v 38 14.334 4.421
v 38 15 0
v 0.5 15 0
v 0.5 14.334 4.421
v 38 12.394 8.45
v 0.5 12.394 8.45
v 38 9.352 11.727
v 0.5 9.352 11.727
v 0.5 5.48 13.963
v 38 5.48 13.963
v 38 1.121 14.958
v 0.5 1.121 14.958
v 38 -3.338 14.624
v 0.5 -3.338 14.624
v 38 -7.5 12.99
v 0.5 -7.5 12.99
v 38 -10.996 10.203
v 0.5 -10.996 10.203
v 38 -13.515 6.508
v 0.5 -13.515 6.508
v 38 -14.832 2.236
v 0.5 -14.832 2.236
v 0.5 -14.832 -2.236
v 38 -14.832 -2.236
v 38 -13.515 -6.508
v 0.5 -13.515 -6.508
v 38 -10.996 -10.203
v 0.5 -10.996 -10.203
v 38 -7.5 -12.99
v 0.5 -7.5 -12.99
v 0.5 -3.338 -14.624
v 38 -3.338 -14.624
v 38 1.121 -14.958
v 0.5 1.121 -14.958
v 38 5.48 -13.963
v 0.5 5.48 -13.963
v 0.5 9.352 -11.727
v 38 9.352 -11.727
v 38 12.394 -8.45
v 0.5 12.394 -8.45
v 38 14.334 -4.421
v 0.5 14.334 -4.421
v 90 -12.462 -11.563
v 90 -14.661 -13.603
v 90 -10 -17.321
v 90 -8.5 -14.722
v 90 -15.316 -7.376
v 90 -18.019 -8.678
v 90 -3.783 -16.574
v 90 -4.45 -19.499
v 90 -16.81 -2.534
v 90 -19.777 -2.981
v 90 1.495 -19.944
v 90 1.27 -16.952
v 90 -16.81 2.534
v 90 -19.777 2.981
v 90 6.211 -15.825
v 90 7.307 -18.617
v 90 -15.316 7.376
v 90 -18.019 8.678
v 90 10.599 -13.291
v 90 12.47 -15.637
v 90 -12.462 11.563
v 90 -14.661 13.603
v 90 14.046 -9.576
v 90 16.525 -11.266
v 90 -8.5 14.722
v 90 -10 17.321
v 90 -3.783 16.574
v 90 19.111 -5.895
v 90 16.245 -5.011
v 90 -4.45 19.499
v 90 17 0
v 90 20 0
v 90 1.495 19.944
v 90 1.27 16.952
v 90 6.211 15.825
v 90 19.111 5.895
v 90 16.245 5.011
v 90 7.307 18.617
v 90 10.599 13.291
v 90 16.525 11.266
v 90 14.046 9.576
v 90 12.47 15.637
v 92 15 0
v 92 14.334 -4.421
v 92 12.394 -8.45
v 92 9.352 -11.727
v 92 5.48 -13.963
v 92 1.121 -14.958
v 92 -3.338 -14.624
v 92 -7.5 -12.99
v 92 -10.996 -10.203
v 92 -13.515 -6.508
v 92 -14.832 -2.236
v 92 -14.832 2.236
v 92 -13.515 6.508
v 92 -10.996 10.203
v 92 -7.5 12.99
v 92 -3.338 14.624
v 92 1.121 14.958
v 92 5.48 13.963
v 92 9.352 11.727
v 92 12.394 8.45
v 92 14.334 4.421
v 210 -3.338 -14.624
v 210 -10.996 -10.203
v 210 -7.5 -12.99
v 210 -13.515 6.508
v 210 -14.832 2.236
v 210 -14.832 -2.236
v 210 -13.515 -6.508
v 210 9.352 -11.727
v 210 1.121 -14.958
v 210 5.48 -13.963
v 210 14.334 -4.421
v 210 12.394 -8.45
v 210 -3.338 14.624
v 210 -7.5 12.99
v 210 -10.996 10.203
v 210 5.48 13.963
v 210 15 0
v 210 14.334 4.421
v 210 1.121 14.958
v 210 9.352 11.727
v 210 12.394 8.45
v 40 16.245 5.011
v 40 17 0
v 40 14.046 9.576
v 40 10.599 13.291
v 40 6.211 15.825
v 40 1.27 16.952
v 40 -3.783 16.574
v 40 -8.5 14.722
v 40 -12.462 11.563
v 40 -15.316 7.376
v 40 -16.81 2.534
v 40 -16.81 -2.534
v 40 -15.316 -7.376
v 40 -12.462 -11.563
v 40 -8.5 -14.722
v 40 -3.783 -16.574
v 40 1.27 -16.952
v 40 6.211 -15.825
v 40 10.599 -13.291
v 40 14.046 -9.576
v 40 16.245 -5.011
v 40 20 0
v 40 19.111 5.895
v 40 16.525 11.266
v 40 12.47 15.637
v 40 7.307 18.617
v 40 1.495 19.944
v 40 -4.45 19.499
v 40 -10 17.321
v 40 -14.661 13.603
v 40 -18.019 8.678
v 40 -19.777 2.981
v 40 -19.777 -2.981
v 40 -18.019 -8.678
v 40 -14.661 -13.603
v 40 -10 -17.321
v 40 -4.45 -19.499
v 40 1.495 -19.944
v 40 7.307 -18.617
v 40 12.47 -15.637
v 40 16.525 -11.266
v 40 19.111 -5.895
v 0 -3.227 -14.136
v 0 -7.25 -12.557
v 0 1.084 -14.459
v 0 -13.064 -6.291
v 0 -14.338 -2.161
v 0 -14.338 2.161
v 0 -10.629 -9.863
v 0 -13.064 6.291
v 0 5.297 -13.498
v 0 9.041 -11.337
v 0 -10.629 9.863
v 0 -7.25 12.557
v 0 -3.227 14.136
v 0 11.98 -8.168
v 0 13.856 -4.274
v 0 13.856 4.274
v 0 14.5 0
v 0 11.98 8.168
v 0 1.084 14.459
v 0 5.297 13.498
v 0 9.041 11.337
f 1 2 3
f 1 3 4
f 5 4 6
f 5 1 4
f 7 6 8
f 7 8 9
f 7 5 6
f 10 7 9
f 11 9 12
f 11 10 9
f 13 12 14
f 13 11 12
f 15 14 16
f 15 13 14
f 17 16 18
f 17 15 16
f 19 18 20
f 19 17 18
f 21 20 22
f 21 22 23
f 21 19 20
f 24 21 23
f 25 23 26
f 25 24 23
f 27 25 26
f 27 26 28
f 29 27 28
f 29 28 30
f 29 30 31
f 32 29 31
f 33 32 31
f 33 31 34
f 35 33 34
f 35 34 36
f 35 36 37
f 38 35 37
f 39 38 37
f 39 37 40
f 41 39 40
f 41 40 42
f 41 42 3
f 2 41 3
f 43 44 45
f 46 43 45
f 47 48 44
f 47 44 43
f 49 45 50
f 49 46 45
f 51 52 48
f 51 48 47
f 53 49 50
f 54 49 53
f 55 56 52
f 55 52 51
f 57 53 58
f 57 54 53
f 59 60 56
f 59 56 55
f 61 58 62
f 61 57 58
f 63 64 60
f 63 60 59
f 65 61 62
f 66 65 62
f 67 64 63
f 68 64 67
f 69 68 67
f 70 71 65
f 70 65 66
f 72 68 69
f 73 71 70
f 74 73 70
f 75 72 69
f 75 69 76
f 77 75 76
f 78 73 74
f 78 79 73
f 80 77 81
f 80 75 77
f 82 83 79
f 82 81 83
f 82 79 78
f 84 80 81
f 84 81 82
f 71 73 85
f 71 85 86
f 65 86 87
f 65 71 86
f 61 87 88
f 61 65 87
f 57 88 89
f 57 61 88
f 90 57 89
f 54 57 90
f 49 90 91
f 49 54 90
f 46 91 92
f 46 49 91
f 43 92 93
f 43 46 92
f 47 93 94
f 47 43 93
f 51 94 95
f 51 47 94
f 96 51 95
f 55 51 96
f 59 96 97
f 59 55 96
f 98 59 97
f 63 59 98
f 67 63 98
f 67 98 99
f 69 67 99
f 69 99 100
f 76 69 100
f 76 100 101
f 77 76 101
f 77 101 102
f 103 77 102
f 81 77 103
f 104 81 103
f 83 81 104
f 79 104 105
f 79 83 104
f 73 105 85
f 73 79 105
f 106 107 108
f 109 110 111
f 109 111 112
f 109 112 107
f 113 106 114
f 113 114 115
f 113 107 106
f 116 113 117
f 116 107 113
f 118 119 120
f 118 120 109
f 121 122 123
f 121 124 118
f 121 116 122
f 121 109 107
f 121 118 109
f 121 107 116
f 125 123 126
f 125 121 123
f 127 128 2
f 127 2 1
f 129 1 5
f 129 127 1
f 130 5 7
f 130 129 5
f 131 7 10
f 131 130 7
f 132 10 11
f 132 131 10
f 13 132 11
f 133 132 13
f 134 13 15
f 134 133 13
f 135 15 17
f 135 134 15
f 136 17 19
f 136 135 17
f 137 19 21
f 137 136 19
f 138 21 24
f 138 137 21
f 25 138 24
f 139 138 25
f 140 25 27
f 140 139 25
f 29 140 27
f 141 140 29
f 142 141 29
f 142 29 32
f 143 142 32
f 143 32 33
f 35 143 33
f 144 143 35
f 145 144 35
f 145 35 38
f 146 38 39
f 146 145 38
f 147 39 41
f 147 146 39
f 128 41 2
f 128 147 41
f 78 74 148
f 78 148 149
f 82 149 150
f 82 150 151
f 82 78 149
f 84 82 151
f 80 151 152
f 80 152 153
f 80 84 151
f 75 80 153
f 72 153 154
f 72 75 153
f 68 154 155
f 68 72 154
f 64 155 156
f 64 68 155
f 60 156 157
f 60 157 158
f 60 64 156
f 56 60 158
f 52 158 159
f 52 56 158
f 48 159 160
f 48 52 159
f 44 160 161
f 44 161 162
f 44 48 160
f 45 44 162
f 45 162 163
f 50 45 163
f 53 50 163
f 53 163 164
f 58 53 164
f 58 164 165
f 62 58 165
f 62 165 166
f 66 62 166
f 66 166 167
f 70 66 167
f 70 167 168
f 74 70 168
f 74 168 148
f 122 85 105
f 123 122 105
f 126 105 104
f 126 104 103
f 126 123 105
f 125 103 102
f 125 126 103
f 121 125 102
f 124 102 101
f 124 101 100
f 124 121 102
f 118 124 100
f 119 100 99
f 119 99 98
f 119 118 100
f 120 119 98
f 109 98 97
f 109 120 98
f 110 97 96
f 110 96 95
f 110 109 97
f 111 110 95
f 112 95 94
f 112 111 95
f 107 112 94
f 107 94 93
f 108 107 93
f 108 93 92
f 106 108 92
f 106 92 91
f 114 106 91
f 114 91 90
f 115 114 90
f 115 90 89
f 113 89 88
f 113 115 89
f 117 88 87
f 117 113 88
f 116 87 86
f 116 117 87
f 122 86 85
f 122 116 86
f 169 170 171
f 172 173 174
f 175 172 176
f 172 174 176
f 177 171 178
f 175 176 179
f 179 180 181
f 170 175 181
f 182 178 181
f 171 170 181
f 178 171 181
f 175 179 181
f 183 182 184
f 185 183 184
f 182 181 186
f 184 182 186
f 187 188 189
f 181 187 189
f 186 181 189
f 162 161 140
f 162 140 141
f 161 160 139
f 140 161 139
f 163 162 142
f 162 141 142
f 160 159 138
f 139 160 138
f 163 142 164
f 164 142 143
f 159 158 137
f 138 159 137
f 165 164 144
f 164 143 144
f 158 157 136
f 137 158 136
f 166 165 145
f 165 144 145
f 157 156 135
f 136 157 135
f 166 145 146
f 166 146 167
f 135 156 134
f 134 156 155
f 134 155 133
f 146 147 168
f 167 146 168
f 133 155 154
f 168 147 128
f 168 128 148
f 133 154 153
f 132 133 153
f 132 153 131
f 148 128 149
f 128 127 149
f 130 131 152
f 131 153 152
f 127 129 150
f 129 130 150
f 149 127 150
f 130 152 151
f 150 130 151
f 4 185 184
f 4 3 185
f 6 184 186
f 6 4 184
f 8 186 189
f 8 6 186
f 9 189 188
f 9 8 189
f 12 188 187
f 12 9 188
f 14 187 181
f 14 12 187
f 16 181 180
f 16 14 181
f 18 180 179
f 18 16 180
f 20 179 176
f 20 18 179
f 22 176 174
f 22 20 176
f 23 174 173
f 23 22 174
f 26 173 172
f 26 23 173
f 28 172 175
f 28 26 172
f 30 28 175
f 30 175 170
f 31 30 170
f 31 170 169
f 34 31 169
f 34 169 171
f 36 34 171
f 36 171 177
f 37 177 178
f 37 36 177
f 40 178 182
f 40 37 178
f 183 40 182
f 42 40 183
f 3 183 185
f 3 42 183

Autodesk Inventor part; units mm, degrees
ref_plane "Start Plane" through (0, 0, 0) normal (1, 0, 0) x (0, 1, 0)
ref_plane "XZ Plane" through (0, 0, 0) normal (0, 1, 0) x (-1, 0, 0)
ref_plane "XY Plane" through (0, 0, 0) normal (0, 0, 1) x (1, 0, 0)
sketch "Main Sketch" plane through (0, 0, 0) normal (0, 0, 1) x (1, 0, 0)
  line L0 (0, 0) -> (210, 0)
  line L1 (0, 0) -> (0, 15)
  line L2 (0, 15) -> (40, 15)
  line L3 (40, 15) -> (40, 20)
  line L4 (90, 20) -> (90, 15)
  line L5 (40, 20) -> (90, 20)
  line L6 (210, 15) -> (210, 0)
  line L7 (90, 15) -> (210, 15)
  dimension "d3" = 30
  dimension "d4" = 40
  dimension "d5" = 30
revolve "Revolution1" add sketch "Main Sketch" angle 360 about axis through (0, 0, 0) along (1, 0, 0)
chamfer "Chamfer3" distance 2 angle 45 1 edges at (40, -15, 0) measured on face at (26.6667, 14.8058, -2.4062)
chamfer "Chamfer1" distance 0.5 angle 45 1 edges at (0, -15, 0) measured on face at (25.3333, 14.9514, -1.207)
chamfer "Chamfer2" distance 2 angle 45 1 edges at (90, -15, 0) measured on face at (170, 14.9514, -1.207)
equation "\"Length\" = 210"
properties part number "Shaft" material "Steel"
